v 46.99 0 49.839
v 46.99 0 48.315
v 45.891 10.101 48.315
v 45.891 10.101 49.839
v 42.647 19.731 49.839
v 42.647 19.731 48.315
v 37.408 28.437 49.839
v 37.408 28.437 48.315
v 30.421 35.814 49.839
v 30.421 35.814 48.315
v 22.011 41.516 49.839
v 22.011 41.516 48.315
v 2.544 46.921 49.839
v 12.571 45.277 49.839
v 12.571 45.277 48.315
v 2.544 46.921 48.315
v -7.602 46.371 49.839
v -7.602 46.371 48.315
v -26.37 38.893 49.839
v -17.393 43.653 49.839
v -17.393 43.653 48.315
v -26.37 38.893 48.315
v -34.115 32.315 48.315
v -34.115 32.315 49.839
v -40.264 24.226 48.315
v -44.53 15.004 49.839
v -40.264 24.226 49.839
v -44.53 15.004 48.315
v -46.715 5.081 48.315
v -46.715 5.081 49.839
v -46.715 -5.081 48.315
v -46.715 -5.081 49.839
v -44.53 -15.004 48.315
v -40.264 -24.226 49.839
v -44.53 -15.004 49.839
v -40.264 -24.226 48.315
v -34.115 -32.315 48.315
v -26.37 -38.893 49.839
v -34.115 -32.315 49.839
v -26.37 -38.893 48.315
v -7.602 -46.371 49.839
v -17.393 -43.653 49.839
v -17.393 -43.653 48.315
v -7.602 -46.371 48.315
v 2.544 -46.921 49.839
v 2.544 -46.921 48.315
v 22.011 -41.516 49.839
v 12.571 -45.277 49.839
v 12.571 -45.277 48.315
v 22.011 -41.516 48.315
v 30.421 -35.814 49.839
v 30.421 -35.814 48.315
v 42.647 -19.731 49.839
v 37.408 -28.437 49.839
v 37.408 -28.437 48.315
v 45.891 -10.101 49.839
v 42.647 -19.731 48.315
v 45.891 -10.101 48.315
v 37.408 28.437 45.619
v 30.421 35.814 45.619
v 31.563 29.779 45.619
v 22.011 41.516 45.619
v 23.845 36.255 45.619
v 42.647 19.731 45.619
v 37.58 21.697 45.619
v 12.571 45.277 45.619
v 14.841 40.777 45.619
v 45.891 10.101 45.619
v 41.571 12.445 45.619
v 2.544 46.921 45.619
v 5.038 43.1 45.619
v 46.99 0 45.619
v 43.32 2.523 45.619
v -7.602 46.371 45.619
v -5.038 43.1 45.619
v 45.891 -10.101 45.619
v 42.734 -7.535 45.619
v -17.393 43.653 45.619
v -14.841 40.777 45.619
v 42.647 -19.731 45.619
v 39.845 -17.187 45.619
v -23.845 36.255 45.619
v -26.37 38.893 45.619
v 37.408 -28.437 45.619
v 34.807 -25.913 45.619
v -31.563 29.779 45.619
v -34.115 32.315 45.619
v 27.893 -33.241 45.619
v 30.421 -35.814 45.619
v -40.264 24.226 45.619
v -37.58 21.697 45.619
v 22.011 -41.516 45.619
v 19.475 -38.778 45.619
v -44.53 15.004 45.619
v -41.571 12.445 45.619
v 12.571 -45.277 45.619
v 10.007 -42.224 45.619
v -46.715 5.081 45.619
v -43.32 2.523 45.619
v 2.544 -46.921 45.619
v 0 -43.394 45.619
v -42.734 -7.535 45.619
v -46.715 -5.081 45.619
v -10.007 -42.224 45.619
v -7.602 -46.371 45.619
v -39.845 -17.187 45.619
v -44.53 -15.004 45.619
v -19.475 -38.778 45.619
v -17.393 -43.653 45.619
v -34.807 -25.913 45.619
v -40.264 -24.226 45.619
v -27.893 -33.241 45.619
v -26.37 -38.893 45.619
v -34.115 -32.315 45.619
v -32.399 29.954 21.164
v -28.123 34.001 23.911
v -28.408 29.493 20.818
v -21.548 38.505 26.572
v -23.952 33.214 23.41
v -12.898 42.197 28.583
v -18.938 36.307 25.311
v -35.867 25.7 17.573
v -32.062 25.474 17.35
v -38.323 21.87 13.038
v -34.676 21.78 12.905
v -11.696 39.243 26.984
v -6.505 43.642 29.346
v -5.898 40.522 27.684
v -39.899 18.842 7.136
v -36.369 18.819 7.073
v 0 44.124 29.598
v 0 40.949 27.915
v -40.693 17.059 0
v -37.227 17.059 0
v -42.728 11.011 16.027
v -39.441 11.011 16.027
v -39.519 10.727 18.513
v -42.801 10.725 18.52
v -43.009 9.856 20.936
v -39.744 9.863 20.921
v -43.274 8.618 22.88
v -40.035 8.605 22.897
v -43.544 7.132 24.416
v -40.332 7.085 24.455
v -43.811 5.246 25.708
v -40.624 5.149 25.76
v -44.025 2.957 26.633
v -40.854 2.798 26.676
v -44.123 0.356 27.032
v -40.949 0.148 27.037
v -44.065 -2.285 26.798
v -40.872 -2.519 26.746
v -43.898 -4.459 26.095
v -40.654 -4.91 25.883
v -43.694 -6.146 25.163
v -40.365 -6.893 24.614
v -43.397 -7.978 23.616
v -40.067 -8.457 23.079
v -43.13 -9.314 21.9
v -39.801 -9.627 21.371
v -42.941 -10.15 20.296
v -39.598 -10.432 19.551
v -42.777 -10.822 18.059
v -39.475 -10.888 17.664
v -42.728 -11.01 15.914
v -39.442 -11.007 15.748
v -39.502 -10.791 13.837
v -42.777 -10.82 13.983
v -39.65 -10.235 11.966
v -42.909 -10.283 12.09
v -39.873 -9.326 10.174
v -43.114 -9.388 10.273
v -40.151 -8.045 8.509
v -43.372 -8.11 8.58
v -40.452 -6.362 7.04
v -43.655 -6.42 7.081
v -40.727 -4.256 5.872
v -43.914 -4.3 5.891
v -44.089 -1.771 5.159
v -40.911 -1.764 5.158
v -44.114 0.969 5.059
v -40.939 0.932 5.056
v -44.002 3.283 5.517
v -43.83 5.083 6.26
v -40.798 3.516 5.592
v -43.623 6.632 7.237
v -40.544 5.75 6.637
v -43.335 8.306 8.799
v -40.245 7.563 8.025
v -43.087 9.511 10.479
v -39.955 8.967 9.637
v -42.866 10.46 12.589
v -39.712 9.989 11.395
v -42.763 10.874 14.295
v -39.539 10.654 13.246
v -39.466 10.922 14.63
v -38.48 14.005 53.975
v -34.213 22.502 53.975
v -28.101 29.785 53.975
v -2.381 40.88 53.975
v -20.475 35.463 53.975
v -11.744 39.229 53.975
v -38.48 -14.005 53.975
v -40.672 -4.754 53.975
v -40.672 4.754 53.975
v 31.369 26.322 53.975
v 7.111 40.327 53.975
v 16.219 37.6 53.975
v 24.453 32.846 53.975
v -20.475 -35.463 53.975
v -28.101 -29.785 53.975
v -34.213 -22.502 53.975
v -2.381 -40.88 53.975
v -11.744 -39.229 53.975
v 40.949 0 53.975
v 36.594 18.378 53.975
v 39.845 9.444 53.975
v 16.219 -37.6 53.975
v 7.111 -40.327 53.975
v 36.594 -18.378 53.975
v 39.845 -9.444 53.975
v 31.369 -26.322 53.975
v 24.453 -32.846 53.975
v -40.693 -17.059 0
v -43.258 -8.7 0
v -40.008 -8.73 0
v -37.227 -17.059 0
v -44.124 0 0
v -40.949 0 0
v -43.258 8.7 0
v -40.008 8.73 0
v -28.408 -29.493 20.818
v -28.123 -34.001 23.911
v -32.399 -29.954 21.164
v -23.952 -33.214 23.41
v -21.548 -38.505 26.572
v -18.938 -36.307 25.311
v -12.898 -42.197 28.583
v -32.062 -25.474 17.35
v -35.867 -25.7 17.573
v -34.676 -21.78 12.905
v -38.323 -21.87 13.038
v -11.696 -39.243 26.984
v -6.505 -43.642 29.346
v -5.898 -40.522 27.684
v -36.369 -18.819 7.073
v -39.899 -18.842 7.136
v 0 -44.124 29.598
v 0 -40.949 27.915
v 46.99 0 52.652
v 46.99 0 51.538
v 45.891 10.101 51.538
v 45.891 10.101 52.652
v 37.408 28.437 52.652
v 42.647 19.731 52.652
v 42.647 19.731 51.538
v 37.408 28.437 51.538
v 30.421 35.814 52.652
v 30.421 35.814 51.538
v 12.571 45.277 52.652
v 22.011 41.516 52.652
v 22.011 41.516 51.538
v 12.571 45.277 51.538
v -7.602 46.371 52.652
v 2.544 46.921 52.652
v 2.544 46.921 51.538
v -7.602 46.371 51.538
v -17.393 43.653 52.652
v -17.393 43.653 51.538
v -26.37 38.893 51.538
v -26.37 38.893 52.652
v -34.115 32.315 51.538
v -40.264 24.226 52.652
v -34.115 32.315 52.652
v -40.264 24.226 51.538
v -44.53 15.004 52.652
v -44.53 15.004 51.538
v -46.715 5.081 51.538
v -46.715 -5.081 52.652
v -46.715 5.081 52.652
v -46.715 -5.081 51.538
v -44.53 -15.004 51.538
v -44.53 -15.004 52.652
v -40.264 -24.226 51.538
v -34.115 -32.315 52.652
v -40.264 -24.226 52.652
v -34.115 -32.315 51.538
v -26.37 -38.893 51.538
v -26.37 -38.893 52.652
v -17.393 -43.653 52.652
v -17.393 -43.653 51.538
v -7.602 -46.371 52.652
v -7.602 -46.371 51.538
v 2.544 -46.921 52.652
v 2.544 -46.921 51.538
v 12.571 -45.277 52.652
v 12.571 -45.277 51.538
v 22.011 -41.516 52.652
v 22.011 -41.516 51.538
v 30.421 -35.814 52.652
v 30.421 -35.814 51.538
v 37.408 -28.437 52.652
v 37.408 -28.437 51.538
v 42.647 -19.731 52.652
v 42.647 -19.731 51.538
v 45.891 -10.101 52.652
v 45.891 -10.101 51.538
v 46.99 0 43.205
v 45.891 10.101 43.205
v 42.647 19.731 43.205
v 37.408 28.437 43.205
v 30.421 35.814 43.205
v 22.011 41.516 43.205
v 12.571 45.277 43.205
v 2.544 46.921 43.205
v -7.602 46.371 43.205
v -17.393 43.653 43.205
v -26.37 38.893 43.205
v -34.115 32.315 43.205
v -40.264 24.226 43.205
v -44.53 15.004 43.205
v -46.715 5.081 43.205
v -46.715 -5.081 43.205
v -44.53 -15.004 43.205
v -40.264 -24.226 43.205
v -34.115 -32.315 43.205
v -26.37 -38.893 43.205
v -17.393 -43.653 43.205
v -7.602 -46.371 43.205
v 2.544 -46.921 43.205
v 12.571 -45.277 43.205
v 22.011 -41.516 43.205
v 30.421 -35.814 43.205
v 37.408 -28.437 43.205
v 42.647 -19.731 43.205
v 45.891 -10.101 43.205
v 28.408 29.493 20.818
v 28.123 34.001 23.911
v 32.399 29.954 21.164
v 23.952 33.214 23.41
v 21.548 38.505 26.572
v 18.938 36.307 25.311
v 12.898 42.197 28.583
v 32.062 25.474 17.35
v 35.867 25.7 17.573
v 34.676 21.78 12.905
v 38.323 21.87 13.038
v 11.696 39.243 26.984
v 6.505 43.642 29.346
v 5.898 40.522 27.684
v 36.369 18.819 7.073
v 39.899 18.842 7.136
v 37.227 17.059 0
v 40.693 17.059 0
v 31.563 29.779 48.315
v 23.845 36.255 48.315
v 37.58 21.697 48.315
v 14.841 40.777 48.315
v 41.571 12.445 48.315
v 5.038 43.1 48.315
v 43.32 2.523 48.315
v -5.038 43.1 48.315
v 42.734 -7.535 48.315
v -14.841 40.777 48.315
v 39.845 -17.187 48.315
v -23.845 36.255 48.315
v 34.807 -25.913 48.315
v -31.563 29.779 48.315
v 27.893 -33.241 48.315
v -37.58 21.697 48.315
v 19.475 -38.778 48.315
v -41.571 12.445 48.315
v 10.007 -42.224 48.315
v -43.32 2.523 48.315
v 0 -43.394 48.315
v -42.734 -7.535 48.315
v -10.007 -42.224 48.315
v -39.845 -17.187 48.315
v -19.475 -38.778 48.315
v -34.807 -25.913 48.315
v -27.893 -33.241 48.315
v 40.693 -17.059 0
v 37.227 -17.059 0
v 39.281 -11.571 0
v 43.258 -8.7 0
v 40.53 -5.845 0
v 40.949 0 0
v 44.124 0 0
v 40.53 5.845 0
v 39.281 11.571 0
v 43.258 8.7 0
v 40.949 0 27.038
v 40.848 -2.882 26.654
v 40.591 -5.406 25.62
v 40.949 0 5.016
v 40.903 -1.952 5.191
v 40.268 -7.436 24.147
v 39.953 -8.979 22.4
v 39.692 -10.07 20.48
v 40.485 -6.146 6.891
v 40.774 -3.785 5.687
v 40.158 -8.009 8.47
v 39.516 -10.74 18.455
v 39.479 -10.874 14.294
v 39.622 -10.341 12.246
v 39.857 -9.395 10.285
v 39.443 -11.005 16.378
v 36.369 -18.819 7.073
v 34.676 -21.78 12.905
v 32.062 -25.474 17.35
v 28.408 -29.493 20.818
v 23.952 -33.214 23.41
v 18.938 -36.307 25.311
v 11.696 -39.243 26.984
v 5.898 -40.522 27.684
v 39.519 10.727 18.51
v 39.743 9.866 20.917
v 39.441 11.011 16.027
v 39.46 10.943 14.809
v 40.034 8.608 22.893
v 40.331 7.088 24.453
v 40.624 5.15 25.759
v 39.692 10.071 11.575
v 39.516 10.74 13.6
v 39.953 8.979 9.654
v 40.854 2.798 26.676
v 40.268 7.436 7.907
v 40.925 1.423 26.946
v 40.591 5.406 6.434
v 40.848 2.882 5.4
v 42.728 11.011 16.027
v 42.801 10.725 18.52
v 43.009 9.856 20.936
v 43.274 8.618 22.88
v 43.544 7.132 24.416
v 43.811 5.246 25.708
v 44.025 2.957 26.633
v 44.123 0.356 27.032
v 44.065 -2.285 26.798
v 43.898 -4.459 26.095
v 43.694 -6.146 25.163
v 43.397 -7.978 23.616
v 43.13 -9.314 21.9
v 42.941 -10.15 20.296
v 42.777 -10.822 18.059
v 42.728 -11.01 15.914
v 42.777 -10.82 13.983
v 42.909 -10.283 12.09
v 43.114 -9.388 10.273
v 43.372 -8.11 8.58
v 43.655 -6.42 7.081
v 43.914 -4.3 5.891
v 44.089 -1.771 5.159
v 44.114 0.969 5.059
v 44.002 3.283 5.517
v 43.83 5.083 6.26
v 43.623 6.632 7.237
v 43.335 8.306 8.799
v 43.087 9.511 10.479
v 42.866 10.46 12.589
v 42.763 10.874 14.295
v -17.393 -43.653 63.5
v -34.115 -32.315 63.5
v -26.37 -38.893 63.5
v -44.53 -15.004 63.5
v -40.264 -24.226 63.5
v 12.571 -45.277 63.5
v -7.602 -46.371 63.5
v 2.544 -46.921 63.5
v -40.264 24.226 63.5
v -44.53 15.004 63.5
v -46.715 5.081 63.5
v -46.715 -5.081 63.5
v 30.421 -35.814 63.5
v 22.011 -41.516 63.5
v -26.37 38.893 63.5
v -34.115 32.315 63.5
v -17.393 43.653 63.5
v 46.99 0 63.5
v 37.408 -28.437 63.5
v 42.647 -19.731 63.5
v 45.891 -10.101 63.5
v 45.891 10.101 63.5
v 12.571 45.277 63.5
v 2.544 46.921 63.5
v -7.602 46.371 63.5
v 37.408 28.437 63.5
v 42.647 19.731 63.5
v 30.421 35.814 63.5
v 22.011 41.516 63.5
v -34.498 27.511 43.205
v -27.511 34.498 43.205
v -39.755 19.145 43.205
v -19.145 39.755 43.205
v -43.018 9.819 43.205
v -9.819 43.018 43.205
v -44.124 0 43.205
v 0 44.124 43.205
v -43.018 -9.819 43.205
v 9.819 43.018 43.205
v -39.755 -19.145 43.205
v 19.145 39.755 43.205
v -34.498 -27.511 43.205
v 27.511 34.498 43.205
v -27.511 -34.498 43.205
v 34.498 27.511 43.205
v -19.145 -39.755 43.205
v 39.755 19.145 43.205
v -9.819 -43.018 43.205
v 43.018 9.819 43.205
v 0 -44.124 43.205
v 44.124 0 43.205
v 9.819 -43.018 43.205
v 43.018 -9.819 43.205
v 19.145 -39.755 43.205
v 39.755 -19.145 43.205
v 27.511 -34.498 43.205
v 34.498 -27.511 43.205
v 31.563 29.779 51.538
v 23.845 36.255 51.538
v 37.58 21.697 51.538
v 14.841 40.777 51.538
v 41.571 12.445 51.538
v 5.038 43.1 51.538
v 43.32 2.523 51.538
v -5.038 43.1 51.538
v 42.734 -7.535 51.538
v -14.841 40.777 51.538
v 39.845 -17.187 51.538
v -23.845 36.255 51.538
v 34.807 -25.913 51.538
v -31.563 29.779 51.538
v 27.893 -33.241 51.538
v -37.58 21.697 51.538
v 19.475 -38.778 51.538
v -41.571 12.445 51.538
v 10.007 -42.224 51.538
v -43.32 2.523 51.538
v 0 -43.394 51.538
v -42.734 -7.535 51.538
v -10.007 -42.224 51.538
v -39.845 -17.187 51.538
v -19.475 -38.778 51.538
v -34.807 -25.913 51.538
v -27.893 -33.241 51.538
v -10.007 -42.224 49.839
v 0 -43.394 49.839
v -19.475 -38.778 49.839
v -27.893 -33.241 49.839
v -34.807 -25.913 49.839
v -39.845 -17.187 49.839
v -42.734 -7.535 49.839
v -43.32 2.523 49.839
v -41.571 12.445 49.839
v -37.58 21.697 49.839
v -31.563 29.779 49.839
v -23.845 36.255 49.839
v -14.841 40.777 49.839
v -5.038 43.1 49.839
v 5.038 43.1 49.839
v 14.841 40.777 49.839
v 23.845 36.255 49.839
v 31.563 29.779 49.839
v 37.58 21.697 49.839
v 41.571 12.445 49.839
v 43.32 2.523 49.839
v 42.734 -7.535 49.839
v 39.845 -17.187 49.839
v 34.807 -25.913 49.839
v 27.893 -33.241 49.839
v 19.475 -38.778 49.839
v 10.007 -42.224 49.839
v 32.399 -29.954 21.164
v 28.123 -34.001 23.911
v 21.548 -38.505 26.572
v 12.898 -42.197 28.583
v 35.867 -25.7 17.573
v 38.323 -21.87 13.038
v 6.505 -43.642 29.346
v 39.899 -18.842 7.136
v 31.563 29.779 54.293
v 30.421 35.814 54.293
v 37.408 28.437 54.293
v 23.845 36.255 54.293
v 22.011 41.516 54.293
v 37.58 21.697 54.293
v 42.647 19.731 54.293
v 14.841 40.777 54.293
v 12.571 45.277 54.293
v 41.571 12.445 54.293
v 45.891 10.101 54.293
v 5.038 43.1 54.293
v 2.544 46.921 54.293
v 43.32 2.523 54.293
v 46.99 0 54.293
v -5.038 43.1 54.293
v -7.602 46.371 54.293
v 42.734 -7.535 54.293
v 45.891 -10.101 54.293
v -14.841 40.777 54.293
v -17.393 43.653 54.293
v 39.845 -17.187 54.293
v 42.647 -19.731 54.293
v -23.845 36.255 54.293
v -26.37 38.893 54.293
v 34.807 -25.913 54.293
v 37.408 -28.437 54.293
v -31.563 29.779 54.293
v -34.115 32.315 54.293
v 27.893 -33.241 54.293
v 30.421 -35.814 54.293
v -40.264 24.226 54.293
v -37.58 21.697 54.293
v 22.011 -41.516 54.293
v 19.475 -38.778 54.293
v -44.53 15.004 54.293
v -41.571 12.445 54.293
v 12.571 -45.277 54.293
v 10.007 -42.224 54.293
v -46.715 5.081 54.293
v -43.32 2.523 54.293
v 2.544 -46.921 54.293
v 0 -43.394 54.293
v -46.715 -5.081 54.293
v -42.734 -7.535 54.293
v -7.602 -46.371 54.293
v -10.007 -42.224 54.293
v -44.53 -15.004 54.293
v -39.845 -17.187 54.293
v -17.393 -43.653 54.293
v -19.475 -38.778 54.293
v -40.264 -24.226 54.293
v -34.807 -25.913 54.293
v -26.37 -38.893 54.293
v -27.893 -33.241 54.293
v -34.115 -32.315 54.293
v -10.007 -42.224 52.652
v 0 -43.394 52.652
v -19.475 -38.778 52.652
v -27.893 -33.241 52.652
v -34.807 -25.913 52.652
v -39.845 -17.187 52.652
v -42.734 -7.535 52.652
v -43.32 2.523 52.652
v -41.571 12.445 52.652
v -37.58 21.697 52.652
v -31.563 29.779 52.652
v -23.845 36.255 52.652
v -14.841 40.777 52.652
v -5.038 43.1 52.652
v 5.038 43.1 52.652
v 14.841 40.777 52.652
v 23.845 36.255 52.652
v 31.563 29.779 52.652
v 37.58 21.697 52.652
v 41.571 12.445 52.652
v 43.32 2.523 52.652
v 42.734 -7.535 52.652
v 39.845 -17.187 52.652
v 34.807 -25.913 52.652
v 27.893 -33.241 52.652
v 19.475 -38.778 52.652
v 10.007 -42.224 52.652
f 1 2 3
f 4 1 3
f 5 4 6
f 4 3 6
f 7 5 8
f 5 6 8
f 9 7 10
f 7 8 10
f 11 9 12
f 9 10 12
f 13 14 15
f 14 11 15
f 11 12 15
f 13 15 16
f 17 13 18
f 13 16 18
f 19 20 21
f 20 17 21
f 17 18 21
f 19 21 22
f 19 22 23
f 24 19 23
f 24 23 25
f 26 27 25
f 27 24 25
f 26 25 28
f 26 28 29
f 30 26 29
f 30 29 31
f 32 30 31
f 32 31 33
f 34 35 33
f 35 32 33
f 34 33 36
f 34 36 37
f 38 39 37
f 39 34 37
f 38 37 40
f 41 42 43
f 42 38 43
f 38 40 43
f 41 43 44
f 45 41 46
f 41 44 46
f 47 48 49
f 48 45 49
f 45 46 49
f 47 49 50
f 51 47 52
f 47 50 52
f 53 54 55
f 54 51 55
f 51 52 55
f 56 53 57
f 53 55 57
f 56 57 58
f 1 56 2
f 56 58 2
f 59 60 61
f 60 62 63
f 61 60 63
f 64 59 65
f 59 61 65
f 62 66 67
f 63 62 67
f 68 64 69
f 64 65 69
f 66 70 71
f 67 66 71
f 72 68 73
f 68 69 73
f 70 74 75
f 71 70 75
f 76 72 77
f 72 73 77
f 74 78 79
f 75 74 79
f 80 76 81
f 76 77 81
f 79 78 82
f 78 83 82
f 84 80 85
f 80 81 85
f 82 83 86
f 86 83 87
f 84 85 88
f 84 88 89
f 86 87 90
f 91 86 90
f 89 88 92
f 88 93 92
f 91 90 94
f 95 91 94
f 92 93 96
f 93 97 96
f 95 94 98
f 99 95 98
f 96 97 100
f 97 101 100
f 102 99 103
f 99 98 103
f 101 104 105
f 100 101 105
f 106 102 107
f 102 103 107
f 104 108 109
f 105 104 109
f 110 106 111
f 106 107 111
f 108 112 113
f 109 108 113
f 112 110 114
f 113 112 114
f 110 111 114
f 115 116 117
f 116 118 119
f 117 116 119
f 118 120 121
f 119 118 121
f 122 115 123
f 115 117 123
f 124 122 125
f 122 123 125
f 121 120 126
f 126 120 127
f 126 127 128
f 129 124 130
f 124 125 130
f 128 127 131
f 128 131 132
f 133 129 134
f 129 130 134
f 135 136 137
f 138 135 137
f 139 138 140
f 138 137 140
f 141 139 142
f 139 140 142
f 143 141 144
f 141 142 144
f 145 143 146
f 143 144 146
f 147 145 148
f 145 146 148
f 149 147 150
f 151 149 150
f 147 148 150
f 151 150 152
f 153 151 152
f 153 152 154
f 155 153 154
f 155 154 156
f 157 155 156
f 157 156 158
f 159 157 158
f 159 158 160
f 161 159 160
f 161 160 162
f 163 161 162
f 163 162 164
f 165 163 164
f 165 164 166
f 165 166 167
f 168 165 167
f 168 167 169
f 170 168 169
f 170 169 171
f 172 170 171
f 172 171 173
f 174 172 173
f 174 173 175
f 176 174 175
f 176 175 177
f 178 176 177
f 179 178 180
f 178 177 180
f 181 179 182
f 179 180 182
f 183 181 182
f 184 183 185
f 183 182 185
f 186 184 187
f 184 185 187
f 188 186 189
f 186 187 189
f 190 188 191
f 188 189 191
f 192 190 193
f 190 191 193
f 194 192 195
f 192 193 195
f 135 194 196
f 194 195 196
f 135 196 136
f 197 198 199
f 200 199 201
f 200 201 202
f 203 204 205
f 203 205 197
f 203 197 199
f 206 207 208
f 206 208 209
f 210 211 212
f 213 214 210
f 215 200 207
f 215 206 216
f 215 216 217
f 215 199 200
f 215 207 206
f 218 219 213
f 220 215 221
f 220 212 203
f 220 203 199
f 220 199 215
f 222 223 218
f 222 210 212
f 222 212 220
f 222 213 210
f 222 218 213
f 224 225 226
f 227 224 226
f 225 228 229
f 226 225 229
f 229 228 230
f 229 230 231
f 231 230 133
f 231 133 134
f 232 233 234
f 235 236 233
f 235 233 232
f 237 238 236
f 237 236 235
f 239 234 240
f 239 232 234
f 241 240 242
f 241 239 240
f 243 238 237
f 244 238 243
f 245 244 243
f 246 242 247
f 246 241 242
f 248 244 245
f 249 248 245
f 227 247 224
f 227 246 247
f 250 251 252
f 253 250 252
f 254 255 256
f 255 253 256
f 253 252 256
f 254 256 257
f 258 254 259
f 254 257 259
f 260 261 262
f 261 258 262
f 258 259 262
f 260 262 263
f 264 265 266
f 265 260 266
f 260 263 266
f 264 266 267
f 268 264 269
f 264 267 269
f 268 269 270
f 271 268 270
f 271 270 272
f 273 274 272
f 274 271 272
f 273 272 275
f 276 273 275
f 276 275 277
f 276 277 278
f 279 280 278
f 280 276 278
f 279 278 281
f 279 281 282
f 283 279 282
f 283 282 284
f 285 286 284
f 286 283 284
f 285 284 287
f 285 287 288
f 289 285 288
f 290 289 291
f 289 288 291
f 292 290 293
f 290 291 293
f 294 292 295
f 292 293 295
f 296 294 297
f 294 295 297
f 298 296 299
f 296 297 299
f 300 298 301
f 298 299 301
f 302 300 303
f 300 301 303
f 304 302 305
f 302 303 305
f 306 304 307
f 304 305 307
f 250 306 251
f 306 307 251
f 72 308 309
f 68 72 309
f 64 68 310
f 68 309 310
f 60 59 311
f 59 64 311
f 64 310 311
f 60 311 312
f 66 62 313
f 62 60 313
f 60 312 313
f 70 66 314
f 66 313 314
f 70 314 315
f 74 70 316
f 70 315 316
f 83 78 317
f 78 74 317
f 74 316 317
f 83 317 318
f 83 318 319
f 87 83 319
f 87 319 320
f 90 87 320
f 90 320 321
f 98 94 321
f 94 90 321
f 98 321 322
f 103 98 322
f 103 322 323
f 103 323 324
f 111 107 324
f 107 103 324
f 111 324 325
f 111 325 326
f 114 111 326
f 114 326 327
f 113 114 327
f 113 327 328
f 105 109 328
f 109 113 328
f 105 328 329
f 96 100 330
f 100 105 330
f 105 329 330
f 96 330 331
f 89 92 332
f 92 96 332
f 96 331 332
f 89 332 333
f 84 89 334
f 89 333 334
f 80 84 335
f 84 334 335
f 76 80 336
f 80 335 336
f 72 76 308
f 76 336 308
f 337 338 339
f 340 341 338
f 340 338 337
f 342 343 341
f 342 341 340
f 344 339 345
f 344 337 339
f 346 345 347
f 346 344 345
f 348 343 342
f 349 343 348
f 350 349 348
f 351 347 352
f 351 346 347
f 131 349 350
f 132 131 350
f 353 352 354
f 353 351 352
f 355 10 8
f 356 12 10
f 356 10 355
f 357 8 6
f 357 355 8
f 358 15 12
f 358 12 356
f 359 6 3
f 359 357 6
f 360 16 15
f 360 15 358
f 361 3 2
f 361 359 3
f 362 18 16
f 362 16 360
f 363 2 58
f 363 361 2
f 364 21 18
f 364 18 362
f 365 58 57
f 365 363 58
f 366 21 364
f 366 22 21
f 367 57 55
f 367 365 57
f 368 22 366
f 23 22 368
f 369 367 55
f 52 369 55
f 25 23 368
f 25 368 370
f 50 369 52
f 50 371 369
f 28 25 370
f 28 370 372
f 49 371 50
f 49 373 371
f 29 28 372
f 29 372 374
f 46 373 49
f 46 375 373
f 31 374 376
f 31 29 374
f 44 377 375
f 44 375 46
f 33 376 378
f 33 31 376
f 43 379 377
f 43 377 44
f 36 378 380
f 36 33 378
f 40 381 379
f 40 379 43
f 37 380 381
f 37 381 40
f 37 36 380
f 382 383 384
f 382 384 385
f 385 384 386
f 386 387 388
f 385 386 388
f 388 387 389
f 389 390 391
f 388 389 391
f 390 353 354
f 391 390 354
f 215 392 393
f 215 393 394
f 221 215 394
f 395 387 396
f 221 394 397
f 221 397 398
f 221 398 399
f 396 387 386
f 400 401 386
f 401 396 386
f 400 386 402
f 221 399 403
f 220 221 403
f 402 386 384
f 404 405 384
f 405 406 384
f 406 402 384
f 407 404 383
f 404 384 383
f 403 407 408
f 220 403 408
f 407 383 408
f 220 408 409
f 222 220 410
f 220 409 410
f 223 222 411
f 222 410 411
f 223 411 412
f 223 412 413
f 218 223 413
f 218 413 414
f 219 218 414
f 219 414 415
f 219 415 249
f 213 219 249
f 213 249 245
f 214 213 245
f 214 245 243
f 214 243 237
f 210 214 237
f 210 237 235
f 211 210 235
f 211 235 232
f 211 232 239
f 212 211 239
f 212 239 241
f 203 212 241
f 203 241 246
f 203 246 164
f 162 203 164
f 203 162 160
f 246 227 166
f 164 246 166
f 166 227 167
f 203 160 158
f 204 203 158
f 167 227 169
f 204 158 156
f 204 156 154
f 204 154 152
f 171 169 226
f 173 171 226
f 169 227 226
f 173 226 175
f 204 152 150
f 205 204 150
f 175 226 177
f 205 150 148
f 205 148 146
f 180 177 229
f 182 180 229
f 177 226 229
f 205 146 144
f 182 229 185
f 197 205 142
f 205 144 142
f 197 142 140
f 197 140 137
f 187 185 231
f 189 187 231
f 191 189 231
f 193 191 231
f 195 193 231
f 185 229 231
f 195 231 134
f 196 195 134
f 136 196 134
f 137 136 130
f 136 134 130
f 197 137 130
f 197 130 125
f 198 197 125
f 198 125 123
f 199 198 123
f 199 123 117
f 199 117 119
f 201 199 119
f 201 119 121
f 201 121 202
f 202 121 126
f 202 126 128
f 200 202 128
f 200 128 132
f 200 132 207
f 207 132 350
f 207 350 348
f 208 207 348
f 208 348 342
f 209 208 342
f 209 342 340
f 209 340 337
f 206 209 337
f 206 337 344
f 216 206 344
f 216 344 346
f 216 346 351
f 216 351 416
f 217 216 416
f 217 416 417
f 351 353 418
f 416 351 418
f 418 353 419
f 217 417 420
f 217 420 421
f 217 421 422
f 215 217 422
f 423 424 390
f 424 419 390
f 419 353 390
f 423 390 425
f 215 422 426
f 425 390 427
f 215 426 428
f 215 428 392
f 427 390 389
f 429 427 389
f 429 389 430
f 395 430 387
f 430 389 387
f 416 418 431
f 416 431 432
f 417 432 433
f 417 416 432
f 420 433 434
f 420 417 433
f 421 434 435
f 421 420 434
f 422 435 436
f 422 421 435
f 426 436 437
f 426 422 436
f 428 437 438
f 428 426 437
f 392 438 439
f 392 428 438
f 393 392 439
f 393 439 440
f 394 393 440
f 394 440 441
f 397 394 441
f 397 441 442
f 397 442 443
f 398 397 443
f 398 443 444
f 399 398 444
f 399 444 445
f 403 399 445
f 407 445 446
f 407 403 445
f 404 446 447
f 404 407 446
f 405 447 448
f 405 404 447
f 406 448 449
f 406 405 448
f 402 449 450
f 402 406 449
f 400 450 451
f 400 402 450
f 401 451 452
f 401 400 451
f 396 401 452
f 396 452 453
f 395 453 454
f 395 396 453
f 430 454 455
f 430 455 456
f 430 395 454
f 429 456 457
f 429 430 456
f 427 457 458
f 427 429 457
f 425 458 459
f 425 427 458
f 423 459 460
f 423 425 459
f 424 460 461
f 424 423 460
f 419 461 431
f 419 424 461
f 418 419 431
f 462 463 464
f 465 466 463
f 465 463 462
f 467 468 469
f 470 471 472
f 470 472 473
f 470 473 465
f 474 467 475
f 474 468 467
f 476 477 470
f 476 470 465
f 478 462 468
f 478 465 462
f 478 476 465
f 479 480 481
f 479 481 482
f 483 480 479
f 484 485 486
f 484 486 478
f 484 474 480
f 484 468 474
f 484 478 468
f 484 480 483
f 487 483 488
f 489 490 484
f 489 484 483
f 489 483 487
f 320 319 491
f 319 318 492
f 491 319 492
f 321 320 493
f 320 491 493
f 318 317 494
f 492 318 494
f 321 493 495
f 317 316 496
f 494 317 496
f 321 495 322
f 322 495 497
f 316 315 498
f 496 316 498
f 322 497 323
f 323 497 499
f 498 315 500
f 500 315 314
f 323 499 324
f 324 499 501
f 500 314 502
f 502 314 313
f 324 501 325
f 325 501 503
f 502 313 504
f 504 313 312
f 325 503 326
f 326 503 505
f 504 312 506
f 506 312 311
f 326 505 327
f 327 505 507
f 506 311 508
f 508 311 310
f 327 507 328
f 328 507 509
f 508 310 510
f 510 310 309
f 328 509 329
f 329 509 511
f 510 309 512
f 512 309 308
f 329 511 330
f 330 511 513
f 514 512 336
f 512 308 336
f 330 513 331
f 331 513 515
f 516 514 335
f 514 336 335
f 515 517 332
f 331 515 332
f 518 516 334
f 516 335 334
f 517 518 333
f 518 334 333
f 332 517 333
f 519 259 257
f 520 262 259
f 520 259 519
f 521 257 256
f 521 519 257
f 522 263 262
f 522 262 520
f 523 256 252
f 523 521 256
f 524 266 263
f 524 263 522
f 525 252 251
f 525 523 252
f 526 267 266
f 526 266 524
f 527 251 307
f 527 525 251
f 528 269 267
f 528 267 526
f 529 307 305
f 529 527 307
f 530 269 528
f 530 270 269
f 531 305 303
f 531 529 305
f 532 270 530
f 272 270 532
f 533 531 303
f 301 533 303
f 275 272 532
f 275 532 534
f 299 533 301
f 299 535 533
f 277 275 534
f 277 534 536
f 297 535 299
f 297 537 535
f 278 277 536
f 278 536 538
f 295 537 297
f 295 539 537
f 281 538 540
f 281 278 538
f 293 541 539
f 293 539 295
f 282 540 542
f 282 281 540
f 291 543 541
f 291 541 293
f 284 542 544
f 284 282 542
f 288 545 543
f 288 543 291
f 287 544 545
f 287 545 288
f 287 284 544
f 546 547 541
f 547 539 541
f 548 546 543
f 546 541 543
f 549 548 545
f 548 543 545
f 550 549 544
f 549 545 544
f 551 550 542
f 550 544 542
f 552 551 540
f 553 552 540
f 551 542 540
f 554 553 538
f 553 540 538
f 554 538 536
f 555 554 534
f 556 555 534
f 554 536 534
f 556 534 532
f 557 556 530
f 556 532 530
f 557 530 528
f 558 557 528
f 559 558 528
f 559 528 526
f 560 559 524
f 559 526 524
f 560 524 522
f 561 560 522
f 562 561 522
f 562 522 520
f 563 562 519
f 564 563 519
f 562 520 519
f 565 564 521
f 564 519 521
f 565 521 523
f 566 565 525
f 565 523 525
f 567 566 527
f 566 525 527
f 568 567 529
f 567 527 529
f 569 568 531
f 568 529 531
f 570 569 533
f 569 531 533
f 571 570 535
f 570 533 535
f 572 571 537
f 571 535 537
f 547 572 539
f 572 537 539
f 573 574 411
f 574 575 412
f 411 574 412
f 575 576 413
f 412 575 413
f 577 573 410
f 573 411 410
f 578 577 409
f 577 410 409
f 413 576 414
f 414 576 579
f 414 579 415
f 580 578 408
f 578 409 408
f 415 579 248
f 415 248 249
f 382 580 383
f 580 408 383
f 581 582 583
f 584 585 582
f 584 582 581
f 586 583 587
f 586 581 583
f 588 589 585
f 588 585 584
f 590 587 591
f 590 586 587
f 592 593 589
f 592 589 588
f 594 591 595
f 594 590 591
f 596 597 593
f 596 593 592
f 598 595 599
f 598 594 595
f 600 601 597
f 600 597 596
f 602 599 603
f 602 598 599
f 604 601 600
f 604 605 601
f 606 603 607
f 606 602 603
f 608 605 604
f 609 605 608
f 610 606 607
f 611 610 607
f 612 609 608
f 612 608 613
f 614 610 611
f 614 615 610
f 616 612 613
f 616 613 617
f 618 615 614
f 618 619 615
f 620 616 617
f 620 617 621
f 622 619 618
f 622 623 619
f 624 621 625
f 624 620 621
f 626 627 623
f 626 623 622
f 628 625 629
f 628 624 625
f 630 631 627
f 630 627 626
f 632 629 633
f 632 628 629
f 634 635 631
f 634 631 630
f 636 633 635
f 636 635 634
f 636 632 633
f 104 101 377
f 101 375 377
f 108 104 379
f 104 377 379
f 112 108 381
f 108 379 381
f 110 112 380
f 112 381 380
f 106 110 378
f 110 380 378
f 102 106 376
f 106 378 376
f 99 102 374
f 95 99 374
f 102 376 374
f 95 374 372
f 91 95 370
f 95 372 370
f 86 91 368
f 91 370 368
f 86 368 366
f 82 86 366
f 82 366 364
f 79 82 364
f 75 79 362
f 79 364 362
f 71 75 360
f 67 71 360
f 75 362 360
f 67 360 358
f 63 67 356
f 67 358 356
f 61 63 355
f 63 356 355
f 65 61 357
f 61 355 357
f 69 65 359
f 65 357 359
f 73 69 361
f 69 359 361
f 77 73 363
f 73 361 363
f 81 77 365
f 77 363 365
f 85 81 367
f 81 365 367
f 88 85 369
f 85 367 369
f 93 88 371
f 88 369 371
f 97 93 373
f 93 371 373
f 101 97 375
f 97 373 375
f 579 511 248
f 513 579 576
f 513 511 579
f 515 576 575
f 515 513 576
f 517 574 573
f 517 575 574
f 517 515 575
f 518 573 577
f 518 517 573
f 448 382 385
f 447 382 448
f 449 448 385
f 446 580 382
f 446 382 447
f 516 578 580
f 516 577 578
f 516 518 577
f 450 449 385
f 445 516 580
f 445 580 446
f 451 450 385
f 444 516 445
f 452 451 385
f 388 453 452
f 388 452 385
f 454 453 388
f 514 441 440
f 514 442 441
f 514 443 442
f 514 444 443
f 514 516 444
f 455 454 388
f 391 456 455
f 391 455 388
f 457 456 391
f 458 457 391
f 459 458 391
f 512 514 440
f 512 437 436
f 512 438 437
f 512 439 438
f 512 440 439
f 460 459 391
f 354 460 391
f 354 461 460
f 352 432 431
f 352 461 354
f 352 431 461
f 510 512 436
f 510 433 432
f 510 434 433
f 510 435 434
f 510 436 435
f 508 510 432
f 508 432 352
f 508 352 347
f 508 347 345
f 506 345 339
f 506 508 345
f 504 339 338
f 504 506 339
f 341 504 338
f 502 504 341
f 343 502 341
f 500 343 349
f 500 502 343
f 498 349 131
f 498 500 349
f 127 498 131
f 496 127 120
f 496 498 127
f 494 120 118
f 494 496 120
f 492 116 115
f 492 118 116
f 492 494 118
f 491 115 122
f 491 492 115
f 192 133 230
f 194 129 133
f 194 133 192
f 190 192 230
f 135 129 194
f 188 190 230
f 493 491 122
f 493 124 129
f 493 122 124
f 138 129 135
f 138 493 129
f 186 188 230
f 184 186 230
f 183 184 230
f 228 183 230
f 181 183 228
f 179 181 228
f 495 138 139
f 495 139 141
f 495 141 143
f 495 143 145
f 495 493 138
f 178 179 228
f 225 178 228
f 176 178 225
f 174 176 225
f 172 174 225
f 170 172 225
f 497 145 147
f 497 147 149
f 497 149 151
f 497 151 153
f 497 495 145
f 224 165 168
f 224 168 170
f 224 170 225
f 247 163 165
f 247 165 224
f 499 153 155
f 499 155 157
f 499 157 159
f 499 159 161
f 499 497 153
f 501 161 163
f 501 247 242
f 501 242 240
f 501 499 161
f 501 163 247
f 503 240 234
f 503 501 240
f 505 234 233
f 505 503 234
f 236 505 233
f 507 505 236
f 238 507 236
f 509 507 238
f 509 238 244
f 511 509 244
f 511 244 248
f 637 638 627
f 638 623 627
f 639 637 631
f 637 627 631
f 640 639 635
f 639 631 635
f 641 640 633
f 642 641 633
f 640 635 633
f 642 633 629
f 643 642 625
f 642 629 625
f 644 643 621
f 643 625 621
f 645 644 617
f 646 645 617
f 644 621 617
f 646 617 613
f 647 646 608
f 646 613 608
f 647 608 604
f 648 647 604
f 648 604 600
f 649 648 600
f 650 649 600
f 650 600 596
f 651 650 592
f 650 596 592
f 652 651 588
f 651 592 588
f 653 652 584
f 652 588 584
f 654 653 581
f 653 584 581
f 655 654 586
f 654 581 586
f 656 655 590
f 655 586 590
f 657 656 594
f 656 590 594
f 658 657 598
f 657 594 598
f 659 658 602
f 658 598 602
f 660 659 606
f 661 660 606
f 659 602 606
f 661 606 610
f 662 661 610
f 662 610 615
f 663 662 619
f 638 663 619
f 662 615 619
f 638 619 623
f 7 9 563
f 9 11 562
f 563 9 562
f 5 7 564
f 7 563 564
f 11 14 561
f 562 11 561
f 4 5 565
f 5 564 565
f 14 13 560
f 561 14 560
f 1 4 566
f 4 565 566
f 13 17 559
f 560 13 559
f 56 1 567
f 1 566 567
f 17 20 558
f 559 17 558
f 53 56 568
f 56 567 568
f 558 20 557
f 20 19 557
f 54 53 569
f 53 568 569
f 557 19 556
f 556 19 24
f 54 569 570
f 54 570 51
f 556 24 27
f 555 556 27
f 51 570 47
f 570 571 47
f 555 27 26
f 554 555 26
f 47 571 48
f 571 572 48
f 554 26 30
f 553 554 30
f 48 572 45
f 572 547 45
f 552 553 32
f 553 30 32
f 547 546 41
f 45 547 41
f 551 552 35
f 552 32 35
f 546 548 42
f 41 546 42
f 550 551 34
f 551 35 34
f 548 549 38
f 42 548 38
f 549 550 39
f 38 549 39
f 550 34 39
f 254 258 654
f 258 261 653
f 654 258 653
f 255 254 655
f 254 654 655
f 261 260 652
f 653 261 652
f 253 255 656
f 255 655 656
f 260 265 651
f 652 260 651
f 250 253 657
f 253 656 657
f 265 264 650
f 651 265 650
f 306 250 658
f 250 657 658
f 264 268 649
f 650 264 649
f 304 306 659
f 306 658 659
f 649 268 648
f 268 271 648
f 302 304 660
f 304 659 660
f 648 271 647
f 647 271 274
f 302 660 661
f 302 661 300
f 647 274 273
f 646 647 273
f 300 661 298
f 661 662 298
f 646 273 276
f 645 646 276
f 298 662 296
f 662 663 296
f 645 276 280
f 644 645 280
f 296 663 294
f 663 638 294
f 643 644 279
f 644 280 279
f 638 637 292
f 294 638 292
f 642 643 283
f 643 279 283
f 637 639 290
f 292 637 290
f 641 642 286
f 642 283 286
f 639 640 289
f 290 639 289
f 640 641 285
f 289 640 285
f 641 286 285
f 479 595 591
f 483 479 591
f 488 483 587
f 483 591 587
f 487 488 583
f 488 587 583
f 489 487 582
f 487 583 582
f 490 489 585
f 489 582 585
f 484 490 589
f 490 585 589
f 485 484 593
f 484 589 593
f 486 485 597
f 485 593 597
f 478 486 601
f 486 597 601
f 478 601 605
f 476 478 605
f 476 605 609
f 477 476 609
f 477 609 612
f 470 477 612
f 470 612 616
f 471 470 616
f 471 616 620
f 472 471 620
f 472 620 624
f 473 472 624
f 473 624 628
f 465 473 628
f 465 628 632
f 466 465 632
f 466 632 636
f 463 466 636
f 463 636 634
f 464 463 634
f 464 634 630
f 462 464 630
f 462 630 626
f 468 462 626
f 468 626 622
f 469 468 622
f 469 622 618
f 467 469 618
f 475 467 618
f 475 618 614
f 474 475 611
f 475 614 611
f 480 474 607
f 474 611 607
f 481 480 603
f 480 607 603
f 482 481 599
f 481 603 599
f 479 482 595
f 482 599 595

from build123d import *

# Parameters (mm, degrees)
F0_R     = 46.99
F1_DEPTH = 63.5
F2_W     = 8.8553838432
F2_H     = 43.2049967349
F4_W     = 5.4503902793
F4_H     = 1.6409792006
F4_H_2   = 1.6995854676
F4_H_3   = 2.6958957314
F6_R     = 40.9492493689
F7_DEPTH = 53.975
F8_R     = 11.0109
F9_DEPTH = 50.8


with BuildPart() as f1:
    # F0 (on Top) → F1 (new body)
    with BuildSketch(Plane.XY):
        Circle(F0_R)
    extrude(amount=F1_DEPTH)

    # F2 (on Right) → F3 (revolve, cut)
    with BuildSketch(Plane.YZ):
        with Locations((-48.5519412905, 21.6024983674)):
            Rectangle(F2_W, F2_H)
    revolve(axis=Axis((0, 0, 0), (0, 0, 1)), mode=Mode.SUBTRACT)

    # F4 (on Right) → F5 (revolve, cut)
    with BuildSketch(Plane.YZ):
        with Locations((-46.1188144982, 53.4723494202)):
            Rectangle(F4_W, F4_H)
        with Locations((-46.1188144982, 50.6885442883)):
            Rectangle(F4_W, F4_H_2)
        with Locations((-46.1188144982, 46.9670407474)):
            Rectangle(F4_W, F4_H_3)
    revolve(axis=Axis((0, 0, 43.2049967349), (0, 0, -1)), mode=Mode.SUBTRACT)

    # F6 (on face) → F7 (cut)
    with BuildSketch(Plane(origin=(0, 0, 0), x_dir=(1, 0, 0), z_dir=(0, 0, -1))):
        Circle(F6_R)
    extrude(amount=-F7_DEPTH, mode=Mode.SUBTRACT)

    # F8 (on Right) → F9 (cut, symmetric)
    with BuildSketch(Plane.YZ):
        with BuildLine():
            add(Edge.make_bspline(
                [(-46.9745136797, 31.0811214149), (-40.0877244728, 27.5083131565), (-27.2735309688, 20.8604174535), (-16.9769809248, 7.2973682669), (-15.9815300532, -11.6642689281), (-15.8178017222, -17.9375006966), (-15.7510973513, -20.4932708293)],
                knots=[0, 0, 0, 0, 0.2945724143, 0.5481085314, 0.815895417, 1, 1, 1, 1], degree=3))
            Line((-46.9745136797, 31.0811214149), (-50.5986586213, -20.4932708293))
            Line((-50.5986586213, -20.4932708293), (-15.7510973513, -20.4932708293))
        make_face()
        with Locations((0, 16.026975587)):
            Circle(F8_R)
        with BuildLine():
            Line((50.5986586213, -20.4932708293), (46.9745136797, 31.0811214149))
            add(Edge.make_bspline(
                [(46.9745136797, 31.0811214149), (40.0877244728, 27.5083131565), (27.2735309688, 20.8604174535), (16.9769809248, 7.2973682669), (15.9815300532, -11.6642689281), (15.8178017222, -17.9375006966), (15.7510973513, -20.4932708293)],
                knots=[0, 0, 0, 0, 0.2945724143, 0.5481085314, 0.815895417, 1, 1, 1, 1], degree=3))
            Line((15.7510973513, -20.4932708293), (50.5986586213, -20.4932708293))
        make_face()
    extrude(amount=F9_DEPTH, both=True, mode=Mode.SUBTRACT)


solid = f1.part
